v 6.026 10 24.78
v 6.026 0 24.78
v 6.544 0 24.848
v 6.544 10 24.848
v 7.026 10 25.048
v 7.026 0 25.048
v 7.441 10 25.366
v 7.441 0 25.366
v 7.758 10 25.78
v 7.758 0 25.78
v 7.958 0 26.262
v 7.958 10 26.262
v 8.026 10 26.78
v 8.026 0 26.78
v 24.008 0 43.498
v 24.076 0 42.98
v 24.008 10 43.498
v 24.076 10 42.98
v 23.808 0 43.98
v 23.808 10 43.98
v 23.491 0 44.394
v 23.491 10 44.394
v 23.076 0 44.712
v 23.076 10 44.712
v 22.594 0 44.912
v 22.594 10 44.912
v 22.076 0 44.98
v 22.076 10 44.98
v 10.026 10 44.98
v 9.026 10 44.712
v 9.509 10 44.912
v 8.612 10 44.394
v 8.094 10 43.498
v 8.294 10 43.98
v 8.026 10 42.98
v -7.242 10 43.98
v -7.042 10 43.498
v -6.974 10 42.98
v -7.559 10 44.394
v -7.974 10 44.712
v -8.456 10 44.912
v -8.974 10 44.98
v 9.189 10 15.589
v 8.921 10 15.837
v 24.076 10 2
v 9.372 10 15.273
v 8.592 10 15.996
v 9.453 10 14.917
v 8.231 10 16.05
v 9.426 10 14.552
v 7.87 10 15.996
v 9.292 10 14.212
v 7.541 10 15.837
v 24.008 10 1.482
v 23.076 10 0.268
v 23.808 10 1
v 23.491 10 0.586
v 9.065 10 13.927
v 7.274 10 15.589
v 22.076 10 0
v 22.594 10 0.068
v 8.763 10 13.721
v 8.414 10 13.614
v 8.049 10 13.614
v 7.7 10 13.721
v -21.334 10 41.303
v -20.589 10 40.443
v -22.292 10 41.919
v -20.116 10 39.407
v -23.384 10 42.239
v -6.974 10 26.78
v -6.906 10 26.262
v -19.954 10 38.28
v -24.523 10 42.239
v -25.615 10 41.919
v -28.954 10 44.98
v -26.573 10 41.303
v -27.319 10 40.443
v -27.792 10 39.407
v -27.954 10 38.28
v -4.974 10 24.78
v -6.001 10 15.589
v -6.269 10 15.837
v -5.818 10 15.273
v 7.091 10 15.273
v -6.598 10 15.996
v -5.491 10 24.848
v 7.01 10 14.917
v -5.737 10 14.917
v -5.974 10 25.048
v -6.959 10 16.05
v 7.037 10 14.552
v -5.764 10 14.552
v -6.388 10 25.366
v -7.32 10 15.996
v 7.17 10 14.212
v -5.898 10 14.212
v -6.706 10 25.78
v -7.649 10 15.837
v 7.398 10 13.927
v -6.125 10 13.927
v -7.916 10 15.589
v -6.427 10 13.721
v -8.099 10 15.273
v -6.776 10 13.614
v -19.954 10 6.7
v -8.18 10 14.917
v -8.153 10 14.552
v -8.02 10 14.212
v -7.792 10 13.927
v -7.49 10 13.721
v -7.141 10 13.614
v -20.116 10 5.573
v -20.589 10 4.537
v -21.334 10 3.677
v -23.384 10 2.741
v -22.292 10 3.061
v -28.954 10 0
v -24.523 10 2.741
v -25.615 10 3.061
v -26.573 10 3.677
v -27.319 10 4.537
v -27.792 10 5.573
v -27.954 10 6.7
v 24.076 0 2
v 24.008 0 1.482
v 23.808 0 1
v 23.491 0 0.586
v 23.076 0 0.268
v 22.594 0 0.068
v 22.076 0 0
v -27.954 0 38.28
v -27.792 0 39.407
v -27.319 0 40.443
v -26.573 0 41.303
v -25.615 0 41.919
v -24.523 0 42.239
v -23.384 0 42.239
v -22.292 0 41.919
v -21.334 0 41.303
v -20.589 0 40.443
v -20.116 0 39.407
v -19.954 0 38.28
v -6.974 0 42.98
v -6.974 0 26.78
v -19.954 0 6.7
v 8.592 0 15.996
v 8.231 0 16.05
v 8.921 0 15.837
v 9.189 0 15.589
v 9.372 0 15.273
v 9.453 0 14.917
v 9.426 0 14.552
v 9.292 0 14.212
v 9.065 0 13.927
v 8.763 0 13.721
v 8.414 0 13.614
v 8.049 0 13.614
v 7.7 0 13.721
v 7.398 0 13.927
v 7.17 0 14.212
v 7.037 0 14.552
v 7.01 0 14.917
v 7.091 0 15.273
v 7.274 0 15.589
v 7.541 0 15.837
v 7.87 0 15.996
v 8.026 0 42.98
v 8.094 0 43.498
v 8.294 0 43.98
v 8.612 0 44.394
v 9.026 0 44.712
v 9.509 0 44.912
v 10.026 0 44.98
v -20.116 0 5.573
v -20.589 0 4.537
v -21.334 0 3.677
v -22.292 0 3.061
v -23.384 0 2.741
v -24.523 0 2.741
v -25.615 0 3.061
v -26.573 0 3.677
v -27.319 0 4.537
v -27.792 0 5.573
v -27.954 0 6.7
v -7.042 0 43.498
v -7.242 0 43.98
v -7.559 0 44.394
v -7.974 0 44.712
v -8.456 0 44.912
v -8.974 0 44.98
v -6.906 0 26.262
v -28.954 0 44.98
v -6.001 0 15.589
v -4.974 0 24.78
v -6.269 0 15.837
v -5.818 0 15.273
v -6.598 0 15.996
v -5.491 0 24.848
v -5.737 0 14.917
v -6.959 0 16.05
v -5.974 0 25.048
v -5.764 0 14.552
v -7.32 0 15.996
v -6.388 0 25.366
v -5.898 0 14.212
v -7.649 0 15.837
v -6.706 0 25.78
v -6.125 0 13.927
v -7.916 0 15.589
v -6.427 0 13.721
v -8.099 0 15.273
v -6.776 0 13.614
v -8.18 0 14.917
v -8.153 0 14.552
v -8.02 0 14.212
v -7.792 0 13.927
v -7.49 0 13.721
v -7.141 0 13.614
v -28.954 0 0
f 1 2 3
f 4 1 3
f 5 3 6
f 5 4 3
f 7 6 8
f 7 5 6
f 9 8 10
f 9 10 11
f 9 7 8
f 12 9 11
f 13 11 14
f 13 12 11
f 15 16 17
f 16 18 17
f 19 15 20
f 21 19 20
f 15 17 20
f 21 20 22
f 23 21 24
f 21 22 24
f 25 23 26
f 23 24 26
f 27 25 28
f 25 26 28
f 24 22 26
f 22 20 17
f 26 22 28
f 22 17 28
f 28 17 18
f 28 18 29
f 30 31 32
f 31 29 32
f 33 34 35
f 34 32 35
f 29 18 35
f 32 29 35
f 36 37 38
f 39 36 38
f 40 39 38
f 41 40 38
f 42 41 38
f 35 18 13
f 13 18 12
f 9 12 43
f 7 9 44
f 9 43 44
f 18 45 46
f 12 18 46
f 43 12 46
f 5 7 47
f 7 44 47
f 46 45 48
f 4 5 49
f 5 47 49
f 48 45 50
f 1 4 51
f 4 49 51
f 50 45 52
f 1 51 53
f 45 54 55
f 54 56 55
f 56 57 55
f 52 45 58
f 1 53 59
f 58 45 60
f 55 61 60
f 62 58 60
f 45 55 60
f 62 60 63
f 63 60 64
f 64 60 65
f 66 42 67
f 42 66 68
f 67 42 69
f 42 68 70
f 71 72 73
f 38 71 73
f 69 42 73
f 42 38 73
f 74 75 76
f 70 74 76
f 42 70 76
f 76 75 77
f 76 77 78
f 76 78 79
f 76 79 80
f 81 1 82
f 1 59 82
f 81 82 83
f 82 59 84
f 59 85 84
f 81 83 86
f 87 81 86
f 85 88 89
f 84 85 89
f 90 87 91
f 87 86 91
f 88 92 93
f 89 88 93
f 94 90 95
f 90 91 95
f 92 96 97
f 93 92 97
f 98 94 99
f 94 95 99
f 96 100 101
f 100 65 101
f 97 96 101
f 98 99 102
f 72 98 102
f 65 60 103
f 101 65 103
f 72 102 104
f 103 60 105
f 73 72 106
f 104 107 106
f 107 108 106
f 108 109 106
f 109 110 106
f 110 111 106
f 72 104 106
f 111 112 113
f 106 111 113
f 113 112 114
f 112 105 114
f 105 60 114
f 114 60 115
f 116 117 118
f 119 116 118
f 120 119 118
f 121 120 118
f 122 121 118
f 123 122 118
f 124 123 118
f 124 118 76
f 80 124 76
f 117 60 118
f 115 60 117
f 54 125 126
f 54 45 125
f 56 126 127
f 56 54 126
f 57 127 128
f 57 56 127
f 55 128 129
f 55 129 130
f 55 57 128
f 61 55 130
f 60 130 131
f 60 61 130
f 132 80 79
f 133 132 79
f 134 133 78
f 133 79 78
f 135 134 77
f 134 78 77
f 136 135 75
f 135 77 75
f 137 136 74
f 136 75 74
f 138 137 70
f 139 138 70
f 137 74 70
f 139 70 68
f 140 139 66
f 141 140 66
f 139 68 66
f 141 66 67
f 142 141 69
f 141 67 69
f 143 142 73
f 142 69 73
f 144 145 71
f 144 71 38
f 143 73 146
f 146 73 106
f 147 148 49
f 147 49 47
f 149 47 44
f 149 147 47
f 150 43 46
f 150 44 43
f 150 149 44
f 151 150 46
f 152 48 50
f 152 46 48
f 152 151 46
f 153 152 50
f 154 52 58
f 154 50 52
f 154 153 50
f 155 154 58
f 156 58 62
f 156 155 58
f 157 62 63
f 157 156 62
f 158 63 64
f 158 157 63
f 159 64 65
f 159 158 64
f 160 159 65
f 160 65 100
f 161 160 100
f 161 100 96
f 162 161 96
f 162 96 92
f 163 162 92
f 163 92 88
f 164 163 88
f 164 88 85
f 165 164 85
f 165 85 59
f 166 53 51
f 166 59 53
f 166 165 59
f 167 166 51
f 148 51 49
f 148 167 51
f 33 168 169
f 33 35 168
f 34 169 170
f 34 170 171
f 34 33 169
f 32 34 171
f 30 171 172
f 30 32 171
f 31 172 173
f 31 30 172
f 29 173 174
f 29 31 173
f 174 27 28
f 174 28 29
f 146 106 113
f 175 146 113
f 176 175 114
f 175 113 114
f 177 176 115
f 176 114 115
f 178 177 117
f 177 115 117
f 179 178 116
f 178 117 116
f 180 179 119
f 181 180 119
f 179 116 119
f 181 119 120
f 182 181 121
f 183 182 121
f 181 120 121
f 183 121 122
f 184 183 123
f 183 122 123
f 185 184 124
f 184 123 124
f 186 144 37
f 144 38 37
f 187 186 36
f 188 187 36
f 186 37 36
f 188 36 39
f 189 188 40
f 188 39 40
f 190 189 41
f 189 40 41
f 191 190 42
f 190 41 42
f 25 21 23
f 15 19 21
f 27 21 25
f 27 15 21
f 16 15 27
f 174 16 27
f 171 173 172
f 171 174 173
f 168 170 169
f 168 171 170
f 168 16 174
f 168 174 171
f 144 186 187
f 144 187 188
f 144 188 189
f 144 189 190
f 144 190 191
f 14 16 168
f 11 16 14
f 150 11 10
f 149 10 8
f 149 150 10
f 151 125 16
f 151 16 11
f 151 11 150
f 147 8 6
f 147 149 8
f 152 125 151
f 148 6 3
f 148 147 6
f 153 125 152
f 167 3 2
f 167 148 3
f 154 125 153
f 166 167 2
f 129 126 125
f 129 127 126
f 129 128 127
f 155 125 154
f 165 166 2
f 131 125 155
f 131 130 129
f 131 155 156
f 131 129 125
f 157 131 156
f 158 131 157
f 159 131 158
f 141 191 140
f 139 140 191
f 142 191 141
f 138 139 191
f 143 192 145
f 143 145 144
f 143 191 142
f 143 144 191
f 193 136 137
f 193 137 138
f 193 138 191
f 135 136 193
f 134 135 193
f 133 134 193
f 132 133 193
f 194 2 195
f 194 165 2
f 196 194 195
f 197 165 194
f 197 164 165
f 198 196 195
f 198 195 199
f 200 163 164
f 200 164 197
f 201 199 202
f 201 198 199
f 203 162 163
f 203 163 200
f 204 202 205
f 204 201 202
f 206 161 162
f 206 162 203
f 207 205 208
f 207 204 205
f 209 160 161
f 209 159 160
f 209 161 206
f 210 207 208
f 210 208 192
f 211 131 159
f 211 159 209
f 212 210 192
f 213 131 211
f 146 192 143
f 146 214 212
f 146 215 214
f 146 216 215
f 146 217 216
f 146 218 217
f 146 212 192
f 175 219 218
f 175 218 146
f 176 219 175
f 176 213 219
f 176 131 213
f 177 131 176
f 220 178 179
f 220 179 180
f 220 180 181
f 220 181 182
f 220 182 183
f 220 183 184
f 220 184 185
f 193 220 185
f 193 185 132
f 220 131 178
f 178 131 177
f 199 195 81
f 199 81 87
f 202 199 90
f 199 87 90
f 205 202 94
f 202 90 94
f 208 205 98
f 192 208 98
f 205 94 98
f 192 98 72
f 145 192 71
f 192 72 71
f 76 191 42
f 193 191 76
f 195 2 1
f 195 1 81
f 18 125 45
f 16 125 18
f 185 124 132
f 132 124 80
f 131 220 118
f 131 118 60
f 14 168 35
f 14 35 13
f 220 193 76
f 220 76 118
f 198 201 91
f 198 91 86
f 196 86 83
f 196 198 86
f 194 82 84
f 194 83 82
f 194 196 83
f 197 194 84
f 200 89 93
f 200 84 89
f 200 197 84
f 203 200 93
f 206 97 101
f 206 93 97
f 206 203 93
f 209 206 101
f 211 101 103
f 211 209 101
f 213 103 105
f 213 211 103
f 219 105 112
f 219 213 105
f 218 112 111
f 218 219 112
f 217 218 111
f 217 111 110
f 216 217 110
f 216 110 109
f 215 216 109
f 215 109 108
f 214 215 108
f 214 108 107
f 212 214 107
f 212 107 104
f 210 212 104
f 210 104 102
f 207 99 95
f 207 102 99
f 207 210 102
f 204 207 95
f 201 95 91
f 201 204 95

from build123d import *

# Parameters (mm, degrees)
BOSS_EXTRUDE1_DEPTH     = 10
FILLET1_R               = 2
FILLET2_R               = 2
FILLET3_R               = 2
FILLET4_R               = 2
FILLET5_R               = 2
FILLET6_R               = 2
CUT_EXTRUDE3_DEPTH      = 55.419825047
CUT_EXTRUDE3_DEPTH_BACK = 55.419825047
SKETCH4_R               = 1.225
CUT_EXTRUDE4_DEPTH      = 10


with BuildPart() as part:
    # Sketch1 → Boss-Extrude1 (new body)
    with BuildSketch(Plane(origin=(0, 0, 0), x_dir=(1, 0, 0), z_dir=(0, 1, 0))):
        Polygon((-28.953703704, 0), (24.076296296, 0), (24.076296296, -44.98), (8.026296296, -44.98), (8.026296296, -24.78), (-6.973703704, -24.78), (-6.973703704, -44.98), (-28.953703704, -44.98), align=None)
    extrude(amount=BOSS_EXTRUDE1_DEPTH)

    # Fillet1
    fillet1_edges = [part.edges().sort_by_distance(p)[0] for p in [
        (-6.973703704, 5, 24.78),
    ]]
    fillet(fillet1_edges, radius=FILLET1_R)

    # Fillet2
    fillet2_edges = [part.edges().sort_by_distance(p)[0] for p in [
        (8.026296296, 5, 24.78),
    ]]
    fillet(fillet2_edges, radius=FILLET2_R)

    # Fillet3
    fillet3_edges = [part.edges().sort_by_distance(p)[0] for p in [
        (-6.973703704, 5, 44.98),
    ]]
    fillet(fillet3_edges, radius=FILLET3_R)

    # Fillet4
    fillet4_edges = [part.edges().sort_by_distance(p)[0] for p in [
        (8.026296296, 5, 44.98),
    ]]
    fillet(fillet4_edges, radius=FILLET4_R)

    # Fillet5
    fillet5_edges = [part.edges().sort_by_distance(p)[0] for p in [
        (24.076296296, 5, 0),
    ]]
    fillet(fillet5_edges, radius=FILLET5_R)

    # Fillet6
    fillet6_edges = [part.edges().sort_by_distance(p)[0] for p in [
        (24.076296296, 5, 44.98),
    ]]
    fillet(fillet6_edges, radius=FILLET6_R)

    # Sketch4 → Cut-Extrude3 (cut, two sides: drawn at the far end of the back side and taken through both)
    with BuildSketch(Plane(origin=(0, 10, 0), x_dir=(1, 0, 0), z_dir=(0, 1, 0)).offset(-CUT_EXTRUDE3_DEPTH_BACK)):
        with Locations(Location((-6.958703704, -14.825, 0), (0, 0, 270))):
            Circle(SKETCH4_R)
        with Locations(Location((8.231296296, -14.825, 0), (0, 0, 270))):
            Circle(SKETCH4_R)
    extrude(amount=CUT_EXTRUDE3_DEPTH + CUT_EXTRUDE3_DEPTH_BACK, mode=Mode.SUBTRACT)

    # Sketch2 → Cut-Extrude4 (cut)
    with BuildSketch(Plane(origin=(0, 10, 0), x_dir=(1, 0, 0), z_dir=(0, 1, 0))):
        with BuildLine():
            Line((-27.953703704, -6.7), (-27.953703704, -38.28))
            ThreePointArc((-27.953703704, -38.28), (-23.953703704, -42.28), (-19.953703704, -38.28))
            Line((-19.953703704, -38.28), (-19.953703704, -6.7))
            ThreePointArc((-19.953703704, -6.7), (-23.953703704, -2.7), (-27.953703704, -6.7))
        make_face()
    extrude(amount=-CUT_EXTRUDE4_DEPTH, mode=Mode.SUBTRACT)


solid = part.part
